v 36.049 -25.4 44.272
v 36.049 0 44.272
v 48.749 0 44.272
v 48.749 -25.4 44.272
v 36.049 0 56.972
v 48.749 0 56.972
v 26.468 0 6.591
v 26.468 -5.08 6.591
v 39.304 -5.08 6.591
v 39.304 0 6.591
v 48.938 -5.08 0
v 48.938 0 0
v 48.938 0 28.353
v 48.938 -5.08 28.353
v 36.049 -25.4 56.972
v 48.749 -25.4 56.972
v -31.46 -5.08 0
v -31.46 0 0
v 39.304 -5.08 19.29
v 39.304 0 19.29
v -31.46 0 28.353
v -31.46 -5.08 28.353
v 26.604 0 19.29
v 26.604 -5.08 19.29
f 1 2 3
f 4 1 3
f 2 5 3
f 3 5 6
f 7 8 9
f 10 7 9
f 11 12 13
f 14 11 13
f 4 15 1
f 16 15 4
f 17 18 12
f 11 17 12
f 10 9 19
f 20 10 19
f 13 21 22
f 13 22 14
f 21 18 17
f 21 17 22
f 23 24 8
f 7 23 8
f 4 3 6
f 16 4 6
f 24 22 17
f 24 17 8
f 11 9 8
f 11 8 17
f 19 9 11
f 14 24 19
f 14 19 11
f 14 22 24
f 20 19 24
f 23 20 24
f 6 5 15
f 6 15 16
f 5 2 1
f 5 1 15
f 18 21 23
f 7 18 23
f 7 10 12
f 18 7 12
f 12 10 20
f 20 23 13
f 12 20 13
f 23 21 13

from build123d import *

# Parameters (mm, degrees)
F0_W     = 80.398395
F0_H     = 28.353058
F1_DEPTH = 5.08
F3_DEPTH = 5.08
F4_W     = 12.7
F4_H     = 12.7
F5_DEPTH = 25.4


with BuildPart() as f1:
    # F0 (on Front) → F1 (new body)
    with BuildSketch(Plane.XZ):
        with Locations((8.738953, 14.176529)):
            Rectangle(F0_W, F0_H)
    extrude(amount=F1_DEPTH)

    # F2 (on face) → F3 (cut)
    with BuildSketch(Plane.XZ.offset(5.08)):
        Polygon((26.603637, 19.290227), (26.467522, 6.590957), (39.303637, 6.590957), (39.303637, 19.290227), align=None)
    extrude(amount=-F3_DEPTH, mode=Mode.SUBTRACT)


with BuildPart() as f5:
    # F4 (on Front) → F5 (new body)
    with BuildSketch(Plane.XZ):
        with Locations((42.39915, 50.622063)):
            Rectangle(F4_W, F4_H)
    extrude(amount=F5_DEPTH)


solid = Compound([f1.part, f5.part])
